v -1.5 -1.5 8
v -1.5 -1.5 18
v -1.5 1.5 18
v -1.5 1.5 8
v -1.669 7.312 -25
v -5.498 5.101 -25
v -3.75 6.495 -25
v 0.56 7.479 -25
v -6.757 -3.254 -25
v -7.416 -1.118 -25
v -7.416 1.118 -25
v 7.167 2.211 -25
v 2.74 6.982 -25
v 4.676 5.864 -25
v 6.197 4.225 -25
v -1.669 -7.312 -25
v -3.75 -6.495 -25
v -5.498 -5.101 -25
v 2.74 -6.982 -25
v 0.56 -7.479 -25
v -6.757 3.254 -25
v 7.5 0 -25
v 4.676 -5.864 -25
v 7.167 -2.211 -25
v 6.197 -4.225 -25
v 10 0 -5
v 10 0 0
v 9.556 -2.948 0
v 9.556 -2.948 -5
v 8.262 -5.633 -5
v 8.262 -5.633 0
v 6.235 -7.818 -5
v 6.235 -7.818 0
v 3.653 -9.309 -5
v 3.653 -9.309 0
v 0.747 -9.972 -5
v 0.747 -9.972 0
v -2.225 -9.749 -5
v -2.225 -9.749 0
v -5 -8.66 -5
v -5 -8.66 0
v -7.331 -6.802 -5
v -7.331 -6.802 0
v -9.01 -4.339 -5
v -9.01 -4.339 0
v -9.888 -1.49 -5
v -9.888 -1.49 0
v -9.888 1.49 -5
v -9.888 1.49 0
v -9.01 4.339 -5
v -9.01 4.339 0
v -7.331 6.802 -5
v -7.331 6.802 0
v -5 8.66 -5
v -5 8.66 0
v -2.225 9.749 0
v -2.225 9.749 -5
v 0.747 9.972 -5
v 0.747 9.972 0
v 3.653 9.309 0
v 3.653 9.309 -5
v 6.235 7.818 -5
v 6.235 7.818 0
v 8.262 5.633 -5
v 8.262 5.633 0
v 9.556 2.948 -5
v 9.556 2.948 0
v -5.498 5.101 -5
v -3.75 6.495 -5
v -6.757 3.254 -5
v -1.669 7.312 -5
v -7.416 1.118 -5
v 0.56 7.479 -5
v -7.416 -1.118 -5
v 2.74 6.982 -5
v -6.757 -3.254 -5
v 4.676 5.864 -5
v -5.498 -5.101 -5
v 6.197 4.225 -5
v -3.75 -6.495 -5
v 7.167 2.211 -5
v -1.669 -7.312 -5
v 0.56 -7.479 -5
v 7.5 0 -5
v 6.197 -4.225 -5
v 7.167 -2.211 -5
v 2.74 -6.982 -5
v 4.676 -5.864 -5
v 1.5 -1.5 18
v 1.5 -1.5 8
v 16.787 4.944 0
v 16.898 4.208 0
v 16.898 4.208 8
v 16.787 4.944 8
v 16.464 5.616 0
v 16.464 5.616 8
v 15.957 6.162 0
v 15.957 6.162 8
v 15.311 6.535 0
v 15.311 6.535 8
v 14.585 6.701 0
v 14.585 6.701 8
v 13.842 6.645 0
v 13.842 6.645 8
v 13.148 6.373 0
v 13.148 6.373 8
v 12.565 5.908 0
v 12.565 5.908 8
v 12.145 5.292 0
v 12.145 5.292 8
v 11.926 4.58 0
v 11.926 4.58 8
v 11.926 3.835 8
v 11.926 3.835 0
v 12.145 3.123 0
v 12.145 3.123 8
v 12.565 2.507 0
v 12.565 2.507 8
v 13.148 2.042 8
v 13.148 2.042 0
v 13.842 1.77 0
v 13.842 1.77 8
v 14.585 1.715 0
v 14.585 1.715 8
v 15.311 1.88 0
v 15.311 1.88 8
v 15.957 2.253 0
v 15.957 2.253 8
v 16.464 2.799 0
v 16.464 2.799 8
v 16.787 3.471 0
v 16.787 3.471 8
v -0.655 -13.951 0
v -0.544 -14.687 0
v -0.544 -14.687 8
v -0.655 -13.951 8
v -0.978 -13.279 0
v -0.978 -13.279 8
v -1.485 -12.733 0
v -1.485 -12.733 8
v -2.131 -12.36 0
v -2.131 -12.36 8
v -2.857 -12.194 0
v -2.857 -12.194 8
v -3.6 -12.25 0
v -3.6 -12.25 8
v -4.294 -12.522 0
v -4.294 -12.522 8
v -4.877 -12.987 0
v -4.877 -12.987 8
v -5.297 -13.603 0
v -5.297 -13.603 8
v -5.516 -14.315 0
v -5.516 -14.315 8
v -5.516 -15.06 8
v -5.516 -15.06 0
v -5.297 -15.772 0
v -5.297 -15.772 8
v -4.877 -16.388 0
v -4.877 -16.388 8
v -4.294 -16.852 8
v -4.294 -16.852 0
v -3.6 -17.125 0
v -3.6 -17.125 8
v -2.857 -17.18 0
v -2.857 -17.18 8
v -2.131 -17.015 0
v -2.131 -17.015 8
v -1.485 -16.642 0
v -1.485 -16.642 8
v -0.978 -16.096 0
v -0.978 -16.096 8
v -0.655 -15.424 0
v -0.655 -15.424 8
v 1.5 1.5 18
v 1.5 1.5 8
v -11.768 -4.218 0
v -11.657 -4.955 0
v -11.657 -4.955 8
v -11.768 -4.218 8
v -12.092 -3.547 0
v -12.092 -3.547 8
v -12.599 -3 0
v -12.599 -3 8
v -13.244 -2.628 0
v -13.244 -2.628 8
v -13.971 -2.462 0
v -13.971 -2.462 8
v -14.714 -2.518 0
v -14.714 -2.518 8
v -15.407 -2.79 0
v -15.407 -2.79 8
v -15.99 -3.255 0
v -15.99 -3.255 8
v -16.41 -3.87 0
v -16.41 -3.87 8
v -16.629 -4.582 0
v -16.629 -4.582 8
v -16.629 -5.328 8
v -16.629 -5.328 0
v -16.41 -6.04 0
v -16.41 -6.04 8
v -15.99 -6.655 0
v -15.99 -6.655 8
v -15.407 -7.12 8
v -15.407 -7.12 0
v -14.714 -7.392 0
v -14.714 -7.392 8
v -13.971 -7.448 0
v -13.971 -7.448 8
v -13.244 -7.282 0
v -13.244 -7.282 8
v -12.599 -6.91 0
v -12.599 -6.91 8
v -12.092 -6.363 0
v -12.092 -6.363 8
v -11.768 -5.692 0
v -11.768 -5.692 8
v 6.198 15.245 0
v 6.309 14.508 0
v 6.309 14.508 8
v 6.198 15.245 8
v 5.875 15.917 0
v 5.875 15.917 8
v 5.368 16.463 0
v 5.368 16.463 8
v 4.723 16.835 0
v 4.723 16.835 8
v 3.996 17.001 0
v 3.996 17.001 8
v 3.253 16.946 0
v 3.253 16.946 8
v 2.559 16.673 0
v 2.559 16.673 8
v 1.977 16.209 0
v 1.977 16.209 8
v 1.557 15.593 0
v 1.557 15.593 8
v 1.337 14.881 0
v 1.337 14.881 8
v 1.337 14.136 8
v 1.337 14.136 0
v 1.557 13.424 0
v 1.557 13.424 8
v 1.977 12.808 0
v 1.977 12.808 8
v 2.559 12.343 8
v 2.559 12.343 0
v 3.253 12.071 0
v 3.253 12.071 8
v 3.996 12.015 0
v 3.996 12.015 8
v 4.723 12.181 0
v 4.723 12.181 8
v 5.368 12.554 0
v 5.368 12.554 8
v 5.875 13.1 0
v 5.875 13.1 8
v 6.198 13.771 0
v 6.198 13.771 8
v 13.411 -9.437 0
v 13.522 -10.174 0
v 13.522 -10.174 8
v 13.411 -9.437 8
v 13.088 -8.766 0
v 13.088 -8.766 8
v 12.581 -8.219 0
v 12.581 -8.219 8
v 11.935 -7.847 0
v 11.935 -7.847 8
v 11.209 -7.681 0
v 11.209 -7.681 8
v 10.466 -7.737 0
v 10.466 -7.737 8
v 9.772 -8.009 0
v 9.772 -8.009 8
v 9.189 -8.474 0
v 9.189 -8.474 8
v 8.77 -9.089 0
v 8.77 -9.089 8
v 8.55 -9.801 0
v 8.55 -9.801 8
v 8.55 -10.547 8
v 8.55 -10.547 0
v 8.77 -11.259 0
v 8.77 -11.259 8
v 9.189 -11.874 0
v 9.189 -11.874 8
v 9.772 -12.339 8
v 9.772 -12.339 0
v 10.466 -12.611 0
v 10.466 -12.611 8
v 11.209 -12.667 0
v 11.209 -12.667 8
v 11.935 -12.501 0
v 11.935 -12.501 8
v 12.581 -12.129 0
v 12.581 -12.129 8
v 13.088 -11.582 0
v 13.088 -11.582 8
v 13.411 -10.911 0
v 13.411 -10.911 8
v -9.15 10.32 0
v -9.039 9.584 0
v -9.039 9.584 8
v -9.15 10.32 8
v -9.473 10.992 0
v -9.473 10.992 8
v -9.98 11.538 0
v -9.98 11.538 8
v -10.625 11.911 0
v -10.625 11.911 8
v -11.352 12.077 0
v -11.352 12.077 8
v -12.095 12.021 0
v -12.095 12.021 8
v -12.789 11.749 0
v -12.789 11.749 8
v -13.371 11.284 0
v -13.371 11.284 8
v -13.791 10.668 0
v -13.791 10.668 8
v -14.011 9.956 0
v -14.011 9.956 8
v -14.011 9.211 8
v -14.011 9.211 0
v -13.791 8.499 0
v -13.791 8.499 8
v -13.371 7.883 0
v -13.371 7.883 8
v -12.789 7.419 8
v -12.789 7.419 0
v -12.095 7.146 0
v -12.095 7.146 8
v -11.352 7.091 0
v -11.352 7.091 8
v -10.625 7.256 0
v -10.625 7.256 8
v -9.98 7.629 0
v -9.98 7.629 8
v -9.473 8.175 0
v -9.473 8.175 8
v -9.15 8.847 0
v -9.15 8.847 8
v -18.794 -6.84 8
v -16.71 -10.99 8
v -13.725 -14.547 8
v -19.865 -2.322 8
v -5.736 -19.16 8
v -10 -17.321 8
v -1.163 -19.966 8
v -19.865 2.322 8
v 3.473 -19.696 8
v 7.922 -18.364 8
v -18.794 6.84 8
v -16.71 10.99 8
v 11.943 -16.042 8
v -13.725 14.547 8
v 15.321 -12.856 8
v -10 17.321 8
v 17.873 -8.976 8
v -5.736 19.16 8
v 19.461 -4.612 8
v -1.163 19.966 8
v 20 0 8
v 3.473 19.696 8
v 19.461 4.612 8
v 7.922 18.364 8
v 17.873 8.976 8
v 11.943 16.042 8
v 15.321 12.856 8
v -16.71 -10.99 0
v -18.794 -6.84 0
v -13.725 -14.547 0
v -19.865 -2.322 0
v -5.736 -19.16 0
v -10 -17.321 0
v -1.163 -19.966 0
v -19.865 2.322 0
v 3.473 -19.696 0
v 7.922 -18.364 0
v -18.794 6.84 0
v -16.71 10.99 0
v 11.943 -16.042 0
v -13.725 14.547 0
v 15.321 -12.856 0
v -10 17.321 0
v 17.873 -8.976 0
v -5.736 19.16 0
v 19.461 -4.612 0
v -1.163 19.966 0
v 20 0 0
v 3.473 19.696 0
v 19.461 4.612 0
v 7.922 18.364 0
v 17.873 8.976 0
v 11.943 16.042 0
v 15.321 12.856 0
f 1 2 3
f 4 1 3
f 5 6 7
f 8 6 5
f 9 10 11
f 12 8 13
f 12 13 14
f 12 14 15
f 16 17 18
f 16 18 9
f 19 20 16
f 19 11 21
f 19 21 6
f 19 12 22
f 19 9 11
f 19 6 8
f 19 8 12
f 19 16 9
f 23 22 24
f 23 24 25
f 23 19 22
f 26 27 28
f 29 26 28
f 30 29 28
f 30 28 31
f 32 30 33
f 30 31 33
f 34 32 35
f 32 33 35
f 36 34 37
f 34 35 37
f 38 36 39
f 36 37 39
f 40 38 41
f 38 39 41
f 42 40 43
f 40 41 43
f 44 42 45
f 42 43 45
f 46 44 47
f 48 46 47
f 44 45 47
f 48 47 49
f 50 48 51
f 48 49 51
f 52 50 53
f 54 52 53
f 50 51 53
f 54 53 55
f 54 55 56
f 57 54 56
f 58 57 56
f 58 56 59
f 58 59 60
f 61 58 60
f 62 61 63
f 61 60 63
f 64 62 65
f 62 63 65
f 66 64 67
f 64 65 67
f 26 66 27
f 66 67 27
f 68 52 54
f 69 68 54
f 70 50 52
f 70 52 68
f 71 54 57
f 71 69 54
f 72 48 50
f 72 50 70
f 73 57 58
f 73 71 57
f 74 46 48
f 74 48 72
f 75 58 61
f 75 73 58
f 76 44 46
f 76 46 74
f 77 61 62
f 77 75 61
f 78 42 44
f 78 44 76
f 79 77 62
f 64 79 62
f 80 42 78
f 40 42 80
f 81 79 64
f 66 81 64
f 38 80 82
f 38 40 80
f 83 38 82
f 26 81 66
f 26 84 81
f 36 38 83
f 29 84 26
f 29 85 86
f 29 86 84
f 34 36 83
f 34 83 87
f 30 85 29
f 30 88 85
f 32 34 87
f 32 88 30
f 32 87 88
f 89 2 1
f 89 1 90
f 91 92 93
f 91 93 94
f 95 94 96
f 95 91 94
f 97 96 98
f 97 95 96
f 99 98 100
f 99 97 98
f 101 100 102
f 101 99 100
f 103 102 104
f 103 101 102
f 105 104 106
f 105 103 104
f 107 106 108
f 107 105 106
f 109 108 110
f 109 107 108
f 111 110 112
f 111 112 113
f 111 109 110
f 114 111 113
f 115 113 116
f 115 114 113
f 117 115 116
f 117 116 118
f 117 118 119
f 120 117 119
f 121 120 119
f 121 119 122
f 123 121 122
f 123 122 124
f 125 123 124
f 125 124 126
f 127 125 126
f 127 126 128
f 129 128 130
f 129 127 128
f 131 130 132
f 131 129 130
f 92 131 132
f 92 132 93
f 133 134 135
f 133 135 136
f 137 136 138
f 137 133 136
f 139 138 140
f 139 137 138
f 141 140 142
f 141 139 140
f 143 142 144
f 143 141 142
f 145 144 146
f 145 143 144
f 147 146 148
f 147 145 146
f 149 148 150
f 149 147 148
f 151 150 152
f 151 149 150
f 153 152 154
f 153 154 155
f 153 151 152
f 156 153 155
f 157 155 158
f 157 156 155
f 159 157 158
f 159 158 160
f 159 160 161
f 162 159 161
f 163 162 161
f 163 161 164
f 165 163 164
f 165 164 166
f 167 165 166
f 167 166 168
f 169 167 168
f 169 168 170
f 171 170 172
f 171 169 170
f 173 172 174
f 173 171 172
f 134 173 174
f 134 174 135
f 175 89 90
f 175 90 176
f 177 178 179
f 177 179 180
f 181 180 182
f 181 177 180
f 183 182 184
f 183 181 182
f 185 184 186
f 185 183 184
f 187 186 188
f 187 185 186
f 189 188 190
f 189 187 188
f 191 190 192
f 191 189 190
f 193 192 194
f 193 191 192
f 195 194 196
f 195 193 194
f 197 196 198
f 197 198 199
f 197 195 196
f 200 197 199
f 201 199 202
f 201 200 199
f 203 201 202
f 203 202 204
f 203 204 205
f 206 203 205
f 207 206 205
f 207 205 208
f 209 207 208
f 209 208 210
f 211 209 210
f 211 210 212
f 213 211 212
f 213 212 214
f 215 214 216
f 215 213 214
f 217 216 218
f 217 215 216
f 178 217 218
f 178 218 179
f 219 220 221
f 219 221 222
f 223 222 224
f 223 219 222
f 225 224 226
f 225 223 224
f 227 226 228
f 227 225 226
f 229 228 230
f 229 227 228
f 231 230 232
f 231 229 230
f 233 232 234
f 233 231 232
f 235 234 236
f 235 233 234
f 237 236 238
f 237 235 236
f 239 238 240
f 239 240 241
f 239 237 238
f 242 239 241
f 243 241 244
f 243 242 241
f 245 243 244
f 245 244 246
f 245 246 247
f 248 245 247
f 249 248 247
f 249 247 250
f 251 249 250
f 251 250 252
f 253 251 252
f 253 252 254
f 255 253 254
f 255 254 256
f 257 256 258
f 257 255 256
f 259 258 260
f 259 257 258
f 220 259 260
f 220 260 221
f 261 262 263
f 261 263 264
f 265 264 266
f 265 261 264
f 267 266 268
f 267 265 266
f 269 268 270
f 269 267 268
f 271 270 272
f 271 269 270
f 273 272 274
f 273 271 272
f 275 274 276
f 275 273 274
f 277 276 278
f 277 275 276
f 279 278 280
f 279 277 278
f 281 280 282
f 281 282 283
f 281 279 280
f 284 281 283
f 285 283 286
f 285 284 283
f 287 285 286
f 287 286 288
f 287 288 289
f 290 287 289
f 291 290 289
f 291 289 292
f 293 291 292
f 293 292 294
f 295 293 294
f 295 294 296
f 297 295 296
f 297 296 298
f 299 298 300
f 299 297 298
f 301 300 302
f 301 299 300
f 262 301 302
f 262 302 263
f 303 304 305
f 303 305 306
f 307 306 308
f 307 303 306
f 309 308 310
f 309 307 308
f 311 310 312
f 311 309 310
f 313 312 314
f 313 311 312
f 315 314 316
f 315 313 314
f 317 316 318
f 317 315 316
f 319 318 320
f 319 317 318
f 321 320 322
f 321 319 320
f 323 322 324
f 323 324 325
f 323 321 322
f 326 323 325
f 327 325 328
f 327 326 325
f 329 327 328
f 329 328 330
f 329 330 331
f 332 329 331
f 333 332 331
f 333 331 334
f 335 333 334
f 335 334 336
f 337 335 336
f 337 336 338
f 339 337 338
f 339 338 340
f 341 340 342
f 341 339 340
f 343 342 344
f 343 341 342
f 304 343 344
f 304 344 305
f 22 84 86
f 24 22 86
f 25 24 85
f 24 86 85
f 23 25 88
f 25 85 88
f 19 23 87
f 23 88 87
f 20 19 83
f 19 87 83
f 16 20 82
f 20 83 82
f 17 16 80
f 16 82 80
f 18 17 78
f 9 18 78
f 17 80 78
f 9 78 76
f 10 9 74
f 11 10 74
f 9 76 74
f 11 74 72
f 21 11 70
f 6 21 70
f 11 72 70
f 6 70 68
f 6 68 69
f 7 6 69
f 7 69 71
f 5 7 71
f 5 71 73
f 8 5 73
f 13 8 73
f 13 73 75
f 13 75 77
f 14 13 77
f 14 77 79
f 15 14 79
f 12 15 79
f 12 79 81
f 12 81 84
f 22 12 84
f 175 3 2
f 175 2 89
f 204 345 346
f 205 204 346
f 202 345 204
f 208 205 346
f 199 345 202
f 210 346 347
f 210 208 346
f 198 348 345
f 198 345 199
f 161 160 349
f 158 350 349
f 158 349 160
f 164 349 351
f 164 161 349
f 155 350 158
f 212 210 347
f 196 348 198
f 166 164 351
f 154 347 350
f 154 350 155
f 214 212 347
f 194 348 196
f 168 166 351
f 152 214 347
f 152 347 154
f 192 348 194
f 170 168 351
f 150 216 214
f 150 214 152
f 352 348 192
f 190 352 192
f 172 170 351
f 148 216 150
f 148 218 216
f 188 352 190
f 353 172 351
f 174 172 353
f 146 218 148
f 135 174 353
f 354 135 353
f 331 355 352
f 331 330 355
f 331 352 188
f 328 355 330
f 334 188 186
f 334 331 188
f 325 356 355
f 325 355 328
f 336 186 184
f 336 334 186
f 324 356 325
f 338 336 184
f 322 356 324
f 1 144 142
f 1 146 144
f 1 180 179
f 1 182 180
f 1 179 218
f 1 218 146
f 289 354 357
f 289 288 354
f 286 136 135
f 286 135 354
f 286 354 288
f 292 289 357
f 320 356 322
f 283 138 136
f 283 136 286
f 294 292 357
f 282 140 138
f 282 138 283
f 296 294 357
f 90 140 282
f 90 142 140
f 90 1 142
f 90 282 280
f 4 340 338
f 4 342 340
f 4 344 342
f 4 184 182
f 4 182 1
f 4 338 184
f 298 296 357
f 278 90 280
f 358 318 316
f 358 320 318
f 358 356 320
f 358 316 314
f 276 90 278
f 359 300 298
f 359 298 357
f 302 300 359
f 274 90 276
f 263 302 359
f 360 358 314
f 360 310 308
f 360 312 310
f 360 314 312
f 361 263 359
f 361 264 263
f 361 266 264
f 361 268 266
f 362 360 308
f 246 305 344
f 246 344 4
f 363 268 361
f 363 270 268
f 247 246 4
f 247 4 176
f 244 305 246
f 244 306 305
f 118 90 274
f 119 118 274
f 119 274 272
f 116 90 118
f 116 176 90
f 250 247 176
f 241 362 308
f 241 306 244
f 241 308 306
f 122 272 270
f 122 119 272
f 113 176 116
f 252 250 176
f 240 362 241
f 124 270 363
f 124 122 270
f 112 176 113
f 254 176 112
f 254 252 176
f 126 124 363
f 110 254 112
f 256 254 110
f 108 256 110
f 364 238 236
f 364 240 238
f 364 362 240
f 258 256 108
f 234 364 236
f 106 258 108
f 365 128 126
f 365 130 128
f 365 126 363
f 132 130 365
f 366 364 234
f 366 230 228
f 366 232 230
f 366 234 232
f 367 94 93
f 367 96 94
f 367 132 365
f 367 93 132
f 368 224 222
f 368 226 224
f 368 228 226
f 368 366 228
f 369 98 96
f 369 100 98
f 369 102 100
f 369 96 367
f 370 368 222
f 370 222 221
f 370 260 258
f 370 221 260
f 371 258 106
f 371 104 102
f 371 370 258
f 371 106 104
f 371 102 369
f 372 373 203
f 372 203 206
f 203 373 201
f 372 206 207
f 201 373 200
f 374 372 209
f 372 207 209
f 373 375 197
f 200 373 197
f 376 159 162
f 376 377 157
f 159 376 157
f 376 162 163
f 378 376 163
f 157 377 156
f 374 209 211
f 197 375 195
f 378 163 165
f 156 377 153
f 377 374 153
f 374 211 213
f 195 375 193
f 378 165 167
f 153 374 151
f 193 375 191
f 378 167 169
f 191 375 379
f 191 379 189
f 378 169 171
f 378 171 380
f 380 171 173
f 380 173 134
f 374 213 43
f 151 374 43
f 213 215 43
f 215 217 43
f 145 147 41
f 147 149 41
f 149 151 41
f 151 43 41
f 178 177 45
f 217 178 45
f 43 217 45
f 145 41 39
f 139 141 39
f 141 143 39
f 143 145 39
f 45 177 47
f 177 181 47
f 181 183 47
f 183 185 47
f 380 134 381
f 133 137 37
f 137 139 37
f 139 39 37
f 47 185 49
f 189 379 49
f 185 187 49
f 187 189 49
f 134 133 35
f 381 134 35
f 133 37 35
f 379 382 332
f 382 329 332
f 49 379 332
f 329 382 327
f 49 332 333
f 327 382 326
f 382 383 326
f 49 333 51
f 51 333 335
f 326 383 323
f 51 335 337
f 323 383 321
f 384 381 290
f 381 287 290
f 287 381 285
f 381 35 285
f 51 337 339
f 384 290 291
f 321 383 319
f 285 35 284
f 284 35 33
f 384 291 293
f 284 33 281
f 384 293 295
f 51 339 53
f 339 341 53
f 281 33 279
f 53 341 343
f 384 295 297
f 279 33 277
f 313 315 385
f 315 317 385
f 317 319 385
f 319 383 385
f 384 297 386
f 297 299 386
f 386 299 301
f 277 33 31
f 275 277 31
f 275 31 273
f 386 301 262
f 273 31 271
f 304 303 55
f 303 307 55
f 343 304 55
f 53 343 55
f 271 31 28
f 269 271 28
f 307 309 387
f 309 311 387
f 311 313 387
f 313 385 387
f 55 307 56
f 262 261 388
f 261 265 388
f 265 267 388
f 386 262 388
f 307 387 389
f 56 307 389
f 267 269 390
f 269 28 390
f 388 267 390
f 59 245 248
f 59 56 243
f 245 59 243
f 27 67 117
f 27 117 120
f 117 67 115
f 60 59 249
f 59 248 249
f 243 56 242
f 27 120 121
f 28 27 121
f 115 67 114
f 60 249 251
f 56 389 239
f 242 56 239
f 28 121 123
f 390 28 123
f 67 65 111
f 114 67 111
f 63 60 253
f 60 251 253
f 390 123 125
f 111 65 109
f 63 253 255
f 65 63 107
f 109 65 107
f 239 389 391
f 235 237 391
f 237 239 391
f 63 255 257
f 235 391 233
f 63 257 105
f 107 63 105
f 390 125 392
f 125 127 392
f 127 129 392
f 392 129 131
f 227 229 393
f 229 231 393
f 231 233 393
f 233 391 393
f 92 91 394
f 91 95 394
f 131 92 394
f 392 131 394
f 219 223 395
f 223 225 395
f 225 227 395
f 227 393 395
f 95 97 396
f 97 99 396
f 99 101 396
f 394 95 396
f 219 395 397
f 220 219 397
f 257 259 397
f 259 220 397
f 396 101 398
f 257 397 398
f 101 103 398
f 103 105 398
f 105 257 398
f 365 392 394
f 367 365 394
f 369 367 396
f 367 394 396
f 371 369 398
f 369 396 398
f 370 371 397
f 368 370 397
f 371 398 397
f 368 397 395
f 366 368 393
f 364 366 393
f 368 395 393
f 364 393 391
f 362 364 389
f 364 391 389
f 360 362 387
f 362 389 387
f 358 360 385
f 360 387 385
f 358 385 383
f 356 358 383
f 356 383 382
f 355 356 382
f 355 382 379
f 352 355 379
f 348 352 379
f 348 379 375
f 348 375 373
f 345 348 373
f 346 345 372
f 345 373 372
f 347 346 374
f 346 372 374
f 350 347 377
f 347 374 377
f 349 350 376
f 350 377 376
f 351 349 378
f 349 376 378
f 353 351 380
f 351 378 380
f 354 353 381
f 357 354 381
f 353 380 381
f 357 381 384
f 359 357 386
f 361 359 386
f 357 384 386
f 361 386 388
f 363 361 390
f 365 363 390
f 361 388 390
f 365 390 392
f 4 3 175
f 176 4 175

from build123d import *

# Parameters (mm, degrees)
SKETCH1_R           = 20
SKETCH1_R_2         = 2.5
BOSS_EXTRUDE1_DEPTH = 8
SKETCH2_W           = 3
SKETCH2_H           = 3
BOSS_EXTRUDE2_DEPTH = 10
SKETCH3_R           = 7.5
BOSS_EXTRUDE3_DEPTH = 25
SKETCH4_R           = 10
BOSS_EXTRUDE4_DEPTH = 5


with BuildPart() as part:
    # Sketch1 → Boss-Extrude1 (new body)
    with BuildSketch(Plane.XY):
        Circle(SKETCH1_R)
        with Locations((3.80920927, 14.508270908)):
            Circle(SKETCH1_R_2, mode=Mode.SUBTRACT)
        with Locations((14.397906738, 4.207528657)):
            Circle(SKETCH1_R_2, mode=Mode.SUBTRACT)
        with Locations((11.022029668, -10.174031029)):
            Circle(SKETCH1_R_2, mode=Mode.SUBTRACT)
        with Locations((-3.044078256, -14.687390408)):
            Circle(SKETCH1_R_2, mode=Mode.SUBTRACT)
        with Locations((-14.157363478, -4.954934573)):
            Circle(SKETCH1_R_2, mode=Mode.SUBTRACT)
        with Locations((-11.538785608, 9.58359544)):
            Circle(SKETCH1_R_2, mode=Mode.SUBTRACT)
    extrude(amount=BOSS_EXTRUDE1_DEPTH)

    # Sketch2 → Boss-Extrude2 (add)
    with BuildSketch(Plane.XY.offset(8)):
        Rectangle(SKETCH2_W, SKETCH2_H)
    extrude(amount=BOSS_EXTRUDE2_DEPTH)

    # Sketch3 → Boss-Extrude3 (add)
    with BuildSketch(Plane(origin=(0, 0, 0), x_dir=(-1, 0, 0), z_dir=(0, 0, -1))):
        with Locations(Location((0, 0, 0), (0, 0, 180))):
            Circle(SKETCH3_R)
    extrude(amount=BOSS_EXTRUDE3_DEPTH)

    # Sketch4 → Boss-Extrude4 (add)
    with BuildSketch(Plane(origin=(0, 0, 0), x_dir=(-1, 0, 0), z_dir=(0, 0, -1))):
        with Locations(Location((0, 0, 0), (0, 0, 180))):
            Circle(SKETCH4_R)
    extrude(amount=BOSS_EXTRUDE4_DEPTH)


solid = part.part
